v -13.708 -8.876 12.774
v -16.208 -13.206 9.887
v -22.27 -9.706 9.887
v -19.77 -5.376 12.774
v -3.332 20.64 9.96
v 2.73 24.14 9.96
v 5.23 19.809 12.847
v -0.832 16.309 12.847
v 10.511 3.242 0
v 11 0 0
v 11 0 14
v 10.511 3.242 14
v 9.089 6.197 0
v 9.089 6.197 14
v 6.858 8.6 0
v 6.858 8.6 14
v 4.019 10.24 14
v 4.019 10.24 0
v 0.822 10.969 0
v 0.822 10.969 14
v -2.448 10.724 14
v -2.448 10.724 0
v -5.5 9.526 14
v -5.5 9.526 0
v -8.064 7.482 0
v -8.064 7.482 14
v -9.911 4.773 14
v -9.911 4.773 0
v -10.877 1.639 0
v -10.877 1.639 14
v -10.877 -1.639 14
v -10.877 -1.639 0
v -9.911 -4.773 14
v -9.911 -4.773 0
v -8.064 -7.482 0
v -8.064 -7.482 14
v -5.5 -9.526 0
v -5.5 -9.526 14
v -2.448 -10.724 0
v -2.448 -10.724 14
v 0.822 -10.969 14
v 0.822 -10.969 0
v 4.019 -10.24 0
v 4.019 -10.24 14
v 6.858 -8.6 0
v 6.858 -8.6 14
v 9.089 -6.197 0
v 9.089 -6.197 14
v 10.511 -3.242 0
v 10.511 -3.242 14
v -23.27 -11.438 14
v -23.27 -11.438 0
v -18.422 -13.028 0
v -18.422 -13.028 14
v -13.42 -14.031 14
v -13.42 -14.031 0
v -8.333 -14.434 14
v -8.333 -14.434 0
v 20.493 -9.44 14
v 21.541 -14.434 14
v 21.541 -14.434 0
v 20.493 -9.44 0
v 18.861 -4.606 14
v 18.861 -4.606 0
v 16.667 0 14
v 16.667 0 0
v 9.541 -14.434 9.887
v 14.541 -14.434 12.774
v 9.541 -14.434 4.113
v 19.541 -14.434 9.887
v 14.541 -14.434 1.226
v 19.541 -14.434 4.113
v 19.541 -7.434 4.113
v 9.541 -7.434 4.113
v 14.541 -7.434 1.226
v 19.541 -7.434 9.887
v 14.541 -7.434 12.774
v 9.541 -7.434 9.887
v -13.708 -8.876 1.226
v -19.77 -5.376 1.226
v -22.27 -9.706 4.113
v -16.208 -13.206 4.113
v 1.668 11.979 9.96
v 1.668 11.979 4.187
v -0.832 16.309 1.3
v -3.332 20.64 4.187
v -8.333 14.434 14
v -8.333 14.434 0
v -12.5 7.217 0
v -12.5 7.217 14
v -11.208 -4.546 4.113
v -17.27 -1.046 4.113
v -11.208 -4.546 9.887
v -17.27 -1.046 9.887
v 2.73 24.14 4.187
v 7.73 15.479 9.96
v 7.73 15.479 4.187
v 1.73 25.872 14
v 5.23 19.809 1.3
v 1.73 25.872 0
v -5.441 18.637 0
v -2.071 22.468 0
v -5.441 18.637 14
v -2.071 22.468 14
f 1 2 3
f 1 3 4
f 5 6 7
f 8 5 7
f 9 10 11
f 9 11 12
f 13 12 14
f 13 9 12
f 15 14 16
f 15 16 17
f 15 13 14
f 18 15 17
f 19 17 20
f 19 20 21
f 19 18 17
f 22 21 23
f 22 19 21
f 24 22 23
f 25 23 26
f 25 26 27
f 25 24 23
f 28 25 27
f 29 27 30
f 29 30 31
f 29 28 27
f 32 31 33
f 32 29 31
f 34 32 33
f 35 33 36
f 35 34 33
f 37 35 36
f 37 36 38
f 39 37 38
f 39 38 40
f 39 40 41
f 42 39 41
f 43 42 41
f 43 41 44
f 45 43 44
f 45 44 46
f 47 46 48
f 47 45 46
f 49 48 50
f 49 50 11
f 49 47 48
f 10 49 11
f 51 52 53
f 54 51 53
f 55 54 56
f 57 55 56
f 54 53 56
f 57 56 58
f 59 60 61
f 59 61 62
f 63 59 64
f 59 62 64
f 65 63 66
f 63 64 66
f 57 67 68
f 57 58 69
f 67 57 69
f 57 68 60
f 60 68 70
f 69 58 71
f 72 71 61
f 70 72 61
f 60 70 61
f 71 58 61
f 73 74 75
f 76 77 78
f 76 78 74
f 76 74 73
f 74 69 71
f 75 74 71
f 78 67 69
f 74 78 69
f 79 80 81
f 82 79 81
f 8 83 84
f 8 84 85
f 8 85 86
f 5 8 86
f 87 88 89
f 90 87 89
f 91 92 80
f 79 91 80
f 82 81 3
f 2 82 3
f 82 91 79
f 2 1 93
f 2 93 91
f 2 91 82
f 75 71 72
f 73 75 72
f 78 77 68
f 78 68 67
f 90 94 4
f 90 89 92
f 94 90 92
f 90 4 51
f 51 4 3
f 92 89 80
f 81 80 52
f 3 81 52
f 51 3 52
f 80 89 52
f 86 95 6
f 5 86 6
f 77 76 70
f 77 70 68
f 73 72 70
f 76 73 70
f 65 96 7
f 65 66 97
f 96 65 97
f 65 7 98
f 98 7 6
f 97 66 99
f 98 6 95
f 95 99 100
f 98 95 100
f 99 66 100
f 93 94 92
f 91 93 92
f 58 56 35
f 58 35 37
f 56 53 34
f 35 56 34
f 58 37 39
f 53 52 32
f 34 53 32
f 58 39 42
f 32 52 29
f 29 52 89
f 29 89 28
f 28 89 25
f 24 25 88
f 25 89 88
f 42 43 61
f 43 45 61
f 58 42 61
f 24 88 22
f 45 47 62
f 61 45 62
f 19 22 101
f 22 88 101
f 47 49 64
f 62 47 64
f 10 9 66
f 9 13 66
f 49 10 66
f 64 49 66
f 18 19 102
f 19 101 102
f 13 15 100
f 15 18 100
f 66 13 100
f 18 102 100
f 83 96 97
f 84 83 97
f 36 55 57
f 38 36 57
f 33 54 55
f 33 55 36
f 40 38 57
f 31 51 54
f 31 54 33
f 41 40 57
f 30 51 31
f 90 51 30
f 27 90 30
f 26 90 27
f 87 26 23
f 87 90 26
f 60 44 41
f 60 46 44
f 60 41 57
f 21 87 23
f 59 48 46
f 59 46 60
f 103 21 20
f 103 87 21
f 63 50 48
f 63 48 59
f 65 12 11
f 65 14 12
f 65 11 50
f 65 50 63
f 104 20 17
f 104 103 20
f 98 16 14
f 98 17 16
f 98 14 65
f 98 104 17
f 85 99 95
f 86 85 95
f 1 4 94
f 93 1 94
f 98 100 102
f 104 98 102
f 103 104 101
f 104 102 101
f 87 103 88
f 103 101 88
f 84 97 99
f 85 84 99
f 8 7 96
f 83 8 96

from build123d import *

# Parameters (mm, degrees)
F0_R     = 11
F1_DEPTH = 14
F3_DEPTH = 7
F5_DEPTH = 7
F7_DEPTH = 7


with BuildPart() as f1:
    # F0 (on Top) → F1 (new body)
    with BuildSketch(Plane.XY):
        with BuildLine():
            ThreePointArc((21.5405989438, -14.4337567297), (19.7489488314, -6.9989706734), (16.6666666667, 0))
            Line((16.6666666667, 0), (12.5, 7.2168783649))
            Line((12.5, 7.2168783649), (1.7297019, 25.8715818867))
            ThreePointArc((1.7297019, 25.8715818867), (-3.8131871995, 20.6025755779), (-8.3333333333, 14.4337567297))
            Line((-8.3333333333, 14.4337567297), (-12.5, 7.2168783649))
            Line((-12.5, 7.2168783649), (-23.2702981, -11.437825157))
            ThreePointArc((-23.2702981, -11.437825157), (-15.9357602341, -13.6036047731), (-8.3333333333, -14.4337567297))
            Line((-8.3333333333, -14.4337567297), (0, -14.4337567297))
            Line((0, -14.4337567297), (21.5405989438, -14.4337567297))
        make_face()
        Circle(F0_R, mode=Mode.SUBTRACT)
    extrude(amount=F1_DEPTH)

    # F2 (on face) → F3 (cut)
    with BuildSketch(Plane(origin=(12.5, 7.2168783649, 0), x_dir=(-0.5, 0.8660254038, 0), z_dir=(0.8660254038, 0.5, 0))):
        Polygon((19.5405962, 4.1867693368), (19.5405962, 9.9602720287), (14.5405962, 12.8470233746), (9.5405962, 9.9602720287), (9.5405962, 4.1867693368), (14.5405962, 1.3000179909), align=None)
    extrude(amount=-F3_DEPTH, mode=Mode.SUBTRACT)

    # F4 (on face) → F5 (cut)
    with BuildSketch(Plane.XZ.offset(14.4337567297)):
        Polygon((19.5405989438, 4.1132486541), (19.5405989438, 9.8867513459), (14.5405989438, 12.7735026919), (9.5405989438, 9.8867513459), (9.5405989438, 4.1132486541), (14.5405989438, 1.2264973081), align=None)
    extrude(amount=-F5_DEPTH, mode=Mode.SUBTRACT)

    # F6 (on face) → F7 (cut)
    with BuildSketch(Plane(origin=(-12.5, 7.2168783649, 0), x_dir=(-0.5, -0.8660254038, 0), z_dir=(-0.8660254038, 0.5, 0))):
        Polygon((19.5405962, 4.1132486541), (19.5405962, 9.8867513459), (14.5405962, 12.7735026919), (9.5405962, 9.8867513459), (9.5405962, 4.1132486541), (14.5405962, 1.2264973081), align=None)
    extrude(amount=-F7_DEPTH, mode=Mode.SUBTRACT)


solid = f1.part
